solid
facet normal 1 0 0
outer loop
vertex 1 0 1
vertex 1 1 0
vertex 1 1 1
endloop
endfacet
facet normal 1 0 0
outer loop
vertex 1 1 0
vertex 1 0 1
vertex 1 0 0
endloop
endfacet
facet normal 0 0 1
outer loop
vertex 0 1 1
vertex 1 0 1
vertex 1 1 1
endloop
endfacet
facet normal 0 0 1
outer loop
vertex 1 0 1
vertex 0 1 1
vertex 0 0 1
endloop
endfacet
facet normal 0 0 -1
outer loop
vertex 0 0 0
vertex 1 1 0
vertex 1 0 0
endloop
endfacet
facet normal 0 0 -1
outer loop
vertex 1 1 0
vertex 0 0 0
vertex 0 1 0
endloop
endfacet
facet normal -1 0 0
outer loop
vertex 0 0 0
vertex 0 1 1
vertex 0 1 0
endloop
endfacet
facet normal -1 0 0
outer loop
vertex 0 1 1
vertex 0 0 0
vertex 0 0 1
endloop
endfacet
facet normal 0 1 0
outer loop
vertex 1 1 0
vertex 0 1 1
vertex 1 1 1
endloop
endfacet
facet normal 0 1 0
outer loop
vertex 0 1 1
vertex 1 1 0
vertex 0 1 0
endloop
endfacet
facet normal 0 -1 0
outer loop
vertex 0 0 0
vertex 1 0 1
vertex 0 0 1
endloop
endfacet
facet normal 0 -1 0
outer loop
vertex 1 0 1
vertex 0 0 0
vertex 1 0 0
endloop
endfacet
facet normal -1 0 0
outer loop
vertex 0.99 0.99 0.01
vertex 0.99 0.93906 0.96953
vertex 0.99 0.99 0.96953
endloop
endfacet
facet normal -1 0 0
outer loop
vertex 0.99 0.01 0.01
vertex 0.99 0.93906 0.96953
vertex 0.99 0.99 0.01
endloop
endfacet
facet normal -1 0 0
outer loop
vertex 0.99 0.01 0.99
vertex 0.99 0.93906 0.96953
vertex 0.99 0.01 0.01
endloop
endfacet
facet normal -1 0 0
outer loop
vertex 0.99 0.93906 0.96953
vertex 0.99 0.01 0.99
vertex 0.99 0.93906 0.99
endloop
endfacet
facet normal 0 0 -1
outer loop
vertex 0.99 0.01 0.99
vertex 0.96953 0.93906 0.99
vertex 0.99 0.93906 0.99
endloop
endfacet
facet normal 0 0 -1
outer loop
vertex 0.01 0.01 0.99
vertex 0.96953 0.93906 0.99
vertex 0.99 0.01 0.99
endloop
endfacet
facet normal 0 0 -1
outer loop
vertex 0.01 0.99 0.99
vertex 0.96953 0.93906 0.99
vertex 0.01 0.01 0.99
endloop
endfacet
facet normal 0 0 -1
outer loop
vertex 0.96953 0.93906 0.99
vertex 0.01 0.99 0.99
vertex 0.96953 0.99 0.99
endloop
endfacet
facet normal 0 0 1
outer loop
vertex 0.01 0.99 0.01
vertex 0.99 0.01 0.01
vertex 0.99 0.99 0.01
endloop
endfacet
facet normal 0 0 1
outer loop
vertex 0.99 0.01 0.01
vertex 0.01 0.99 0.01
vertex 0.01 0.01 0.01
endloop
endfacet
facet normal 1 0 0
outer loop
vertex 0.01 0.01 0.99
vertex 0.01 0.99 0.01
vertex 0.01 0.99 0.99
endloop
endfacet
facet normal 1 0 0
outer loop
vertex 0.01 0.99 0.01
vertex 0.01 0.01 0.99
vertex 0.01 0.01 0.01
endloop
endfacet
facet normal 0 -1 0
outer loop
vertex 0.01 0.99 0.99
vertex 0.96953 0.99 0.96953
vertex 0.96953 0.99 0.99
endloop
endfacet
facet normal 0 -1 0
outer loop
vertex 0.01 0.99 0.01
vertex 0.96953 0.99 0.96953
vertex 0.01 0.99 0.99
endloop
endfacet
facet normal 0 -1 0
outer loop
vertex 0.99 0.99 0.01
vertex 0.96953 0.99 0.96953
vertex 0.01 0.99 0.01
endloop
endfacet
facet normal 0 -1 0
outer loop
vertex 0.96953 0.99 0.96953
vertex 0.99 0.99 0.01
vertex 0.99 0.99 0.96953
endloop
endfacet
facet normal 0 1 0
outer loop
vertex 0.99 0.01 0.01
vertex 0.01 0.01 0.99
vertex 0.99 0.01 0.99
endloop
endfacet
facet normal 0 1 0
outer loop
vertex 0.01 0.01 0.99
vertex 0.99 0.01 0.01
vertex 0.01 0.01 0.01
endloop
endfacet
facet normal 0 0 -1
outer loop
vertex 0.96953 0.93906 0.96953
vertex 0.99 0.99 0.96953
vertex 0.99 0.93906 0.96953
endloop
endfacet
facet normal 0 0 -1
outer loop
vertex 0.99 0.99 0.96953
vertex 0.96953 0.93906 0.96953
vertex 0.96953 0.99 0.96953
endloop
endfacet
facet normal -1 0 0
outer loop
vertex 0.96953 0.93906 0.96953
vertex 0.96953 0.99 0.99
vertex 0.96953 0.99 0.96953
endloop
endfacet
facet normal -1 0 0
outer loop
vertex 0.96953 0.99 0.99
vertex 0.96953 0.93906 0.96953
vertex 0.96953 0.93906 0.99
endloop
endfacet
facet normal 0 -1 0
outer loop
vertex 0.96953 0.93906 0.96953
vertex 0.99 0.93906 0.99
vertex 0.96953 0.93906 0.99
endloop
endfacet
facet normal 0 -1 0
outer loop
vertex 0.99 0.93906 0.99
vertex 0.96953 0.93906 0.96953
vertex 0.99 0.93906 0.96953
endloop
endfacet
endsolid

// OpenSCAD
translate([0.984375, 0.96875, 0.984375]) color([0.5566697210245537, 0.9242411361984193, 0.4493738479545202]) cube([0.0296875, 0.059375, 0.0296875], center=true);
color([0.3,0.3,0.3,0.3]) difference() { cube([1,1,1]); translate([0.01,0.01,0.01]) cube([0.98,0.98,0.98]); }
